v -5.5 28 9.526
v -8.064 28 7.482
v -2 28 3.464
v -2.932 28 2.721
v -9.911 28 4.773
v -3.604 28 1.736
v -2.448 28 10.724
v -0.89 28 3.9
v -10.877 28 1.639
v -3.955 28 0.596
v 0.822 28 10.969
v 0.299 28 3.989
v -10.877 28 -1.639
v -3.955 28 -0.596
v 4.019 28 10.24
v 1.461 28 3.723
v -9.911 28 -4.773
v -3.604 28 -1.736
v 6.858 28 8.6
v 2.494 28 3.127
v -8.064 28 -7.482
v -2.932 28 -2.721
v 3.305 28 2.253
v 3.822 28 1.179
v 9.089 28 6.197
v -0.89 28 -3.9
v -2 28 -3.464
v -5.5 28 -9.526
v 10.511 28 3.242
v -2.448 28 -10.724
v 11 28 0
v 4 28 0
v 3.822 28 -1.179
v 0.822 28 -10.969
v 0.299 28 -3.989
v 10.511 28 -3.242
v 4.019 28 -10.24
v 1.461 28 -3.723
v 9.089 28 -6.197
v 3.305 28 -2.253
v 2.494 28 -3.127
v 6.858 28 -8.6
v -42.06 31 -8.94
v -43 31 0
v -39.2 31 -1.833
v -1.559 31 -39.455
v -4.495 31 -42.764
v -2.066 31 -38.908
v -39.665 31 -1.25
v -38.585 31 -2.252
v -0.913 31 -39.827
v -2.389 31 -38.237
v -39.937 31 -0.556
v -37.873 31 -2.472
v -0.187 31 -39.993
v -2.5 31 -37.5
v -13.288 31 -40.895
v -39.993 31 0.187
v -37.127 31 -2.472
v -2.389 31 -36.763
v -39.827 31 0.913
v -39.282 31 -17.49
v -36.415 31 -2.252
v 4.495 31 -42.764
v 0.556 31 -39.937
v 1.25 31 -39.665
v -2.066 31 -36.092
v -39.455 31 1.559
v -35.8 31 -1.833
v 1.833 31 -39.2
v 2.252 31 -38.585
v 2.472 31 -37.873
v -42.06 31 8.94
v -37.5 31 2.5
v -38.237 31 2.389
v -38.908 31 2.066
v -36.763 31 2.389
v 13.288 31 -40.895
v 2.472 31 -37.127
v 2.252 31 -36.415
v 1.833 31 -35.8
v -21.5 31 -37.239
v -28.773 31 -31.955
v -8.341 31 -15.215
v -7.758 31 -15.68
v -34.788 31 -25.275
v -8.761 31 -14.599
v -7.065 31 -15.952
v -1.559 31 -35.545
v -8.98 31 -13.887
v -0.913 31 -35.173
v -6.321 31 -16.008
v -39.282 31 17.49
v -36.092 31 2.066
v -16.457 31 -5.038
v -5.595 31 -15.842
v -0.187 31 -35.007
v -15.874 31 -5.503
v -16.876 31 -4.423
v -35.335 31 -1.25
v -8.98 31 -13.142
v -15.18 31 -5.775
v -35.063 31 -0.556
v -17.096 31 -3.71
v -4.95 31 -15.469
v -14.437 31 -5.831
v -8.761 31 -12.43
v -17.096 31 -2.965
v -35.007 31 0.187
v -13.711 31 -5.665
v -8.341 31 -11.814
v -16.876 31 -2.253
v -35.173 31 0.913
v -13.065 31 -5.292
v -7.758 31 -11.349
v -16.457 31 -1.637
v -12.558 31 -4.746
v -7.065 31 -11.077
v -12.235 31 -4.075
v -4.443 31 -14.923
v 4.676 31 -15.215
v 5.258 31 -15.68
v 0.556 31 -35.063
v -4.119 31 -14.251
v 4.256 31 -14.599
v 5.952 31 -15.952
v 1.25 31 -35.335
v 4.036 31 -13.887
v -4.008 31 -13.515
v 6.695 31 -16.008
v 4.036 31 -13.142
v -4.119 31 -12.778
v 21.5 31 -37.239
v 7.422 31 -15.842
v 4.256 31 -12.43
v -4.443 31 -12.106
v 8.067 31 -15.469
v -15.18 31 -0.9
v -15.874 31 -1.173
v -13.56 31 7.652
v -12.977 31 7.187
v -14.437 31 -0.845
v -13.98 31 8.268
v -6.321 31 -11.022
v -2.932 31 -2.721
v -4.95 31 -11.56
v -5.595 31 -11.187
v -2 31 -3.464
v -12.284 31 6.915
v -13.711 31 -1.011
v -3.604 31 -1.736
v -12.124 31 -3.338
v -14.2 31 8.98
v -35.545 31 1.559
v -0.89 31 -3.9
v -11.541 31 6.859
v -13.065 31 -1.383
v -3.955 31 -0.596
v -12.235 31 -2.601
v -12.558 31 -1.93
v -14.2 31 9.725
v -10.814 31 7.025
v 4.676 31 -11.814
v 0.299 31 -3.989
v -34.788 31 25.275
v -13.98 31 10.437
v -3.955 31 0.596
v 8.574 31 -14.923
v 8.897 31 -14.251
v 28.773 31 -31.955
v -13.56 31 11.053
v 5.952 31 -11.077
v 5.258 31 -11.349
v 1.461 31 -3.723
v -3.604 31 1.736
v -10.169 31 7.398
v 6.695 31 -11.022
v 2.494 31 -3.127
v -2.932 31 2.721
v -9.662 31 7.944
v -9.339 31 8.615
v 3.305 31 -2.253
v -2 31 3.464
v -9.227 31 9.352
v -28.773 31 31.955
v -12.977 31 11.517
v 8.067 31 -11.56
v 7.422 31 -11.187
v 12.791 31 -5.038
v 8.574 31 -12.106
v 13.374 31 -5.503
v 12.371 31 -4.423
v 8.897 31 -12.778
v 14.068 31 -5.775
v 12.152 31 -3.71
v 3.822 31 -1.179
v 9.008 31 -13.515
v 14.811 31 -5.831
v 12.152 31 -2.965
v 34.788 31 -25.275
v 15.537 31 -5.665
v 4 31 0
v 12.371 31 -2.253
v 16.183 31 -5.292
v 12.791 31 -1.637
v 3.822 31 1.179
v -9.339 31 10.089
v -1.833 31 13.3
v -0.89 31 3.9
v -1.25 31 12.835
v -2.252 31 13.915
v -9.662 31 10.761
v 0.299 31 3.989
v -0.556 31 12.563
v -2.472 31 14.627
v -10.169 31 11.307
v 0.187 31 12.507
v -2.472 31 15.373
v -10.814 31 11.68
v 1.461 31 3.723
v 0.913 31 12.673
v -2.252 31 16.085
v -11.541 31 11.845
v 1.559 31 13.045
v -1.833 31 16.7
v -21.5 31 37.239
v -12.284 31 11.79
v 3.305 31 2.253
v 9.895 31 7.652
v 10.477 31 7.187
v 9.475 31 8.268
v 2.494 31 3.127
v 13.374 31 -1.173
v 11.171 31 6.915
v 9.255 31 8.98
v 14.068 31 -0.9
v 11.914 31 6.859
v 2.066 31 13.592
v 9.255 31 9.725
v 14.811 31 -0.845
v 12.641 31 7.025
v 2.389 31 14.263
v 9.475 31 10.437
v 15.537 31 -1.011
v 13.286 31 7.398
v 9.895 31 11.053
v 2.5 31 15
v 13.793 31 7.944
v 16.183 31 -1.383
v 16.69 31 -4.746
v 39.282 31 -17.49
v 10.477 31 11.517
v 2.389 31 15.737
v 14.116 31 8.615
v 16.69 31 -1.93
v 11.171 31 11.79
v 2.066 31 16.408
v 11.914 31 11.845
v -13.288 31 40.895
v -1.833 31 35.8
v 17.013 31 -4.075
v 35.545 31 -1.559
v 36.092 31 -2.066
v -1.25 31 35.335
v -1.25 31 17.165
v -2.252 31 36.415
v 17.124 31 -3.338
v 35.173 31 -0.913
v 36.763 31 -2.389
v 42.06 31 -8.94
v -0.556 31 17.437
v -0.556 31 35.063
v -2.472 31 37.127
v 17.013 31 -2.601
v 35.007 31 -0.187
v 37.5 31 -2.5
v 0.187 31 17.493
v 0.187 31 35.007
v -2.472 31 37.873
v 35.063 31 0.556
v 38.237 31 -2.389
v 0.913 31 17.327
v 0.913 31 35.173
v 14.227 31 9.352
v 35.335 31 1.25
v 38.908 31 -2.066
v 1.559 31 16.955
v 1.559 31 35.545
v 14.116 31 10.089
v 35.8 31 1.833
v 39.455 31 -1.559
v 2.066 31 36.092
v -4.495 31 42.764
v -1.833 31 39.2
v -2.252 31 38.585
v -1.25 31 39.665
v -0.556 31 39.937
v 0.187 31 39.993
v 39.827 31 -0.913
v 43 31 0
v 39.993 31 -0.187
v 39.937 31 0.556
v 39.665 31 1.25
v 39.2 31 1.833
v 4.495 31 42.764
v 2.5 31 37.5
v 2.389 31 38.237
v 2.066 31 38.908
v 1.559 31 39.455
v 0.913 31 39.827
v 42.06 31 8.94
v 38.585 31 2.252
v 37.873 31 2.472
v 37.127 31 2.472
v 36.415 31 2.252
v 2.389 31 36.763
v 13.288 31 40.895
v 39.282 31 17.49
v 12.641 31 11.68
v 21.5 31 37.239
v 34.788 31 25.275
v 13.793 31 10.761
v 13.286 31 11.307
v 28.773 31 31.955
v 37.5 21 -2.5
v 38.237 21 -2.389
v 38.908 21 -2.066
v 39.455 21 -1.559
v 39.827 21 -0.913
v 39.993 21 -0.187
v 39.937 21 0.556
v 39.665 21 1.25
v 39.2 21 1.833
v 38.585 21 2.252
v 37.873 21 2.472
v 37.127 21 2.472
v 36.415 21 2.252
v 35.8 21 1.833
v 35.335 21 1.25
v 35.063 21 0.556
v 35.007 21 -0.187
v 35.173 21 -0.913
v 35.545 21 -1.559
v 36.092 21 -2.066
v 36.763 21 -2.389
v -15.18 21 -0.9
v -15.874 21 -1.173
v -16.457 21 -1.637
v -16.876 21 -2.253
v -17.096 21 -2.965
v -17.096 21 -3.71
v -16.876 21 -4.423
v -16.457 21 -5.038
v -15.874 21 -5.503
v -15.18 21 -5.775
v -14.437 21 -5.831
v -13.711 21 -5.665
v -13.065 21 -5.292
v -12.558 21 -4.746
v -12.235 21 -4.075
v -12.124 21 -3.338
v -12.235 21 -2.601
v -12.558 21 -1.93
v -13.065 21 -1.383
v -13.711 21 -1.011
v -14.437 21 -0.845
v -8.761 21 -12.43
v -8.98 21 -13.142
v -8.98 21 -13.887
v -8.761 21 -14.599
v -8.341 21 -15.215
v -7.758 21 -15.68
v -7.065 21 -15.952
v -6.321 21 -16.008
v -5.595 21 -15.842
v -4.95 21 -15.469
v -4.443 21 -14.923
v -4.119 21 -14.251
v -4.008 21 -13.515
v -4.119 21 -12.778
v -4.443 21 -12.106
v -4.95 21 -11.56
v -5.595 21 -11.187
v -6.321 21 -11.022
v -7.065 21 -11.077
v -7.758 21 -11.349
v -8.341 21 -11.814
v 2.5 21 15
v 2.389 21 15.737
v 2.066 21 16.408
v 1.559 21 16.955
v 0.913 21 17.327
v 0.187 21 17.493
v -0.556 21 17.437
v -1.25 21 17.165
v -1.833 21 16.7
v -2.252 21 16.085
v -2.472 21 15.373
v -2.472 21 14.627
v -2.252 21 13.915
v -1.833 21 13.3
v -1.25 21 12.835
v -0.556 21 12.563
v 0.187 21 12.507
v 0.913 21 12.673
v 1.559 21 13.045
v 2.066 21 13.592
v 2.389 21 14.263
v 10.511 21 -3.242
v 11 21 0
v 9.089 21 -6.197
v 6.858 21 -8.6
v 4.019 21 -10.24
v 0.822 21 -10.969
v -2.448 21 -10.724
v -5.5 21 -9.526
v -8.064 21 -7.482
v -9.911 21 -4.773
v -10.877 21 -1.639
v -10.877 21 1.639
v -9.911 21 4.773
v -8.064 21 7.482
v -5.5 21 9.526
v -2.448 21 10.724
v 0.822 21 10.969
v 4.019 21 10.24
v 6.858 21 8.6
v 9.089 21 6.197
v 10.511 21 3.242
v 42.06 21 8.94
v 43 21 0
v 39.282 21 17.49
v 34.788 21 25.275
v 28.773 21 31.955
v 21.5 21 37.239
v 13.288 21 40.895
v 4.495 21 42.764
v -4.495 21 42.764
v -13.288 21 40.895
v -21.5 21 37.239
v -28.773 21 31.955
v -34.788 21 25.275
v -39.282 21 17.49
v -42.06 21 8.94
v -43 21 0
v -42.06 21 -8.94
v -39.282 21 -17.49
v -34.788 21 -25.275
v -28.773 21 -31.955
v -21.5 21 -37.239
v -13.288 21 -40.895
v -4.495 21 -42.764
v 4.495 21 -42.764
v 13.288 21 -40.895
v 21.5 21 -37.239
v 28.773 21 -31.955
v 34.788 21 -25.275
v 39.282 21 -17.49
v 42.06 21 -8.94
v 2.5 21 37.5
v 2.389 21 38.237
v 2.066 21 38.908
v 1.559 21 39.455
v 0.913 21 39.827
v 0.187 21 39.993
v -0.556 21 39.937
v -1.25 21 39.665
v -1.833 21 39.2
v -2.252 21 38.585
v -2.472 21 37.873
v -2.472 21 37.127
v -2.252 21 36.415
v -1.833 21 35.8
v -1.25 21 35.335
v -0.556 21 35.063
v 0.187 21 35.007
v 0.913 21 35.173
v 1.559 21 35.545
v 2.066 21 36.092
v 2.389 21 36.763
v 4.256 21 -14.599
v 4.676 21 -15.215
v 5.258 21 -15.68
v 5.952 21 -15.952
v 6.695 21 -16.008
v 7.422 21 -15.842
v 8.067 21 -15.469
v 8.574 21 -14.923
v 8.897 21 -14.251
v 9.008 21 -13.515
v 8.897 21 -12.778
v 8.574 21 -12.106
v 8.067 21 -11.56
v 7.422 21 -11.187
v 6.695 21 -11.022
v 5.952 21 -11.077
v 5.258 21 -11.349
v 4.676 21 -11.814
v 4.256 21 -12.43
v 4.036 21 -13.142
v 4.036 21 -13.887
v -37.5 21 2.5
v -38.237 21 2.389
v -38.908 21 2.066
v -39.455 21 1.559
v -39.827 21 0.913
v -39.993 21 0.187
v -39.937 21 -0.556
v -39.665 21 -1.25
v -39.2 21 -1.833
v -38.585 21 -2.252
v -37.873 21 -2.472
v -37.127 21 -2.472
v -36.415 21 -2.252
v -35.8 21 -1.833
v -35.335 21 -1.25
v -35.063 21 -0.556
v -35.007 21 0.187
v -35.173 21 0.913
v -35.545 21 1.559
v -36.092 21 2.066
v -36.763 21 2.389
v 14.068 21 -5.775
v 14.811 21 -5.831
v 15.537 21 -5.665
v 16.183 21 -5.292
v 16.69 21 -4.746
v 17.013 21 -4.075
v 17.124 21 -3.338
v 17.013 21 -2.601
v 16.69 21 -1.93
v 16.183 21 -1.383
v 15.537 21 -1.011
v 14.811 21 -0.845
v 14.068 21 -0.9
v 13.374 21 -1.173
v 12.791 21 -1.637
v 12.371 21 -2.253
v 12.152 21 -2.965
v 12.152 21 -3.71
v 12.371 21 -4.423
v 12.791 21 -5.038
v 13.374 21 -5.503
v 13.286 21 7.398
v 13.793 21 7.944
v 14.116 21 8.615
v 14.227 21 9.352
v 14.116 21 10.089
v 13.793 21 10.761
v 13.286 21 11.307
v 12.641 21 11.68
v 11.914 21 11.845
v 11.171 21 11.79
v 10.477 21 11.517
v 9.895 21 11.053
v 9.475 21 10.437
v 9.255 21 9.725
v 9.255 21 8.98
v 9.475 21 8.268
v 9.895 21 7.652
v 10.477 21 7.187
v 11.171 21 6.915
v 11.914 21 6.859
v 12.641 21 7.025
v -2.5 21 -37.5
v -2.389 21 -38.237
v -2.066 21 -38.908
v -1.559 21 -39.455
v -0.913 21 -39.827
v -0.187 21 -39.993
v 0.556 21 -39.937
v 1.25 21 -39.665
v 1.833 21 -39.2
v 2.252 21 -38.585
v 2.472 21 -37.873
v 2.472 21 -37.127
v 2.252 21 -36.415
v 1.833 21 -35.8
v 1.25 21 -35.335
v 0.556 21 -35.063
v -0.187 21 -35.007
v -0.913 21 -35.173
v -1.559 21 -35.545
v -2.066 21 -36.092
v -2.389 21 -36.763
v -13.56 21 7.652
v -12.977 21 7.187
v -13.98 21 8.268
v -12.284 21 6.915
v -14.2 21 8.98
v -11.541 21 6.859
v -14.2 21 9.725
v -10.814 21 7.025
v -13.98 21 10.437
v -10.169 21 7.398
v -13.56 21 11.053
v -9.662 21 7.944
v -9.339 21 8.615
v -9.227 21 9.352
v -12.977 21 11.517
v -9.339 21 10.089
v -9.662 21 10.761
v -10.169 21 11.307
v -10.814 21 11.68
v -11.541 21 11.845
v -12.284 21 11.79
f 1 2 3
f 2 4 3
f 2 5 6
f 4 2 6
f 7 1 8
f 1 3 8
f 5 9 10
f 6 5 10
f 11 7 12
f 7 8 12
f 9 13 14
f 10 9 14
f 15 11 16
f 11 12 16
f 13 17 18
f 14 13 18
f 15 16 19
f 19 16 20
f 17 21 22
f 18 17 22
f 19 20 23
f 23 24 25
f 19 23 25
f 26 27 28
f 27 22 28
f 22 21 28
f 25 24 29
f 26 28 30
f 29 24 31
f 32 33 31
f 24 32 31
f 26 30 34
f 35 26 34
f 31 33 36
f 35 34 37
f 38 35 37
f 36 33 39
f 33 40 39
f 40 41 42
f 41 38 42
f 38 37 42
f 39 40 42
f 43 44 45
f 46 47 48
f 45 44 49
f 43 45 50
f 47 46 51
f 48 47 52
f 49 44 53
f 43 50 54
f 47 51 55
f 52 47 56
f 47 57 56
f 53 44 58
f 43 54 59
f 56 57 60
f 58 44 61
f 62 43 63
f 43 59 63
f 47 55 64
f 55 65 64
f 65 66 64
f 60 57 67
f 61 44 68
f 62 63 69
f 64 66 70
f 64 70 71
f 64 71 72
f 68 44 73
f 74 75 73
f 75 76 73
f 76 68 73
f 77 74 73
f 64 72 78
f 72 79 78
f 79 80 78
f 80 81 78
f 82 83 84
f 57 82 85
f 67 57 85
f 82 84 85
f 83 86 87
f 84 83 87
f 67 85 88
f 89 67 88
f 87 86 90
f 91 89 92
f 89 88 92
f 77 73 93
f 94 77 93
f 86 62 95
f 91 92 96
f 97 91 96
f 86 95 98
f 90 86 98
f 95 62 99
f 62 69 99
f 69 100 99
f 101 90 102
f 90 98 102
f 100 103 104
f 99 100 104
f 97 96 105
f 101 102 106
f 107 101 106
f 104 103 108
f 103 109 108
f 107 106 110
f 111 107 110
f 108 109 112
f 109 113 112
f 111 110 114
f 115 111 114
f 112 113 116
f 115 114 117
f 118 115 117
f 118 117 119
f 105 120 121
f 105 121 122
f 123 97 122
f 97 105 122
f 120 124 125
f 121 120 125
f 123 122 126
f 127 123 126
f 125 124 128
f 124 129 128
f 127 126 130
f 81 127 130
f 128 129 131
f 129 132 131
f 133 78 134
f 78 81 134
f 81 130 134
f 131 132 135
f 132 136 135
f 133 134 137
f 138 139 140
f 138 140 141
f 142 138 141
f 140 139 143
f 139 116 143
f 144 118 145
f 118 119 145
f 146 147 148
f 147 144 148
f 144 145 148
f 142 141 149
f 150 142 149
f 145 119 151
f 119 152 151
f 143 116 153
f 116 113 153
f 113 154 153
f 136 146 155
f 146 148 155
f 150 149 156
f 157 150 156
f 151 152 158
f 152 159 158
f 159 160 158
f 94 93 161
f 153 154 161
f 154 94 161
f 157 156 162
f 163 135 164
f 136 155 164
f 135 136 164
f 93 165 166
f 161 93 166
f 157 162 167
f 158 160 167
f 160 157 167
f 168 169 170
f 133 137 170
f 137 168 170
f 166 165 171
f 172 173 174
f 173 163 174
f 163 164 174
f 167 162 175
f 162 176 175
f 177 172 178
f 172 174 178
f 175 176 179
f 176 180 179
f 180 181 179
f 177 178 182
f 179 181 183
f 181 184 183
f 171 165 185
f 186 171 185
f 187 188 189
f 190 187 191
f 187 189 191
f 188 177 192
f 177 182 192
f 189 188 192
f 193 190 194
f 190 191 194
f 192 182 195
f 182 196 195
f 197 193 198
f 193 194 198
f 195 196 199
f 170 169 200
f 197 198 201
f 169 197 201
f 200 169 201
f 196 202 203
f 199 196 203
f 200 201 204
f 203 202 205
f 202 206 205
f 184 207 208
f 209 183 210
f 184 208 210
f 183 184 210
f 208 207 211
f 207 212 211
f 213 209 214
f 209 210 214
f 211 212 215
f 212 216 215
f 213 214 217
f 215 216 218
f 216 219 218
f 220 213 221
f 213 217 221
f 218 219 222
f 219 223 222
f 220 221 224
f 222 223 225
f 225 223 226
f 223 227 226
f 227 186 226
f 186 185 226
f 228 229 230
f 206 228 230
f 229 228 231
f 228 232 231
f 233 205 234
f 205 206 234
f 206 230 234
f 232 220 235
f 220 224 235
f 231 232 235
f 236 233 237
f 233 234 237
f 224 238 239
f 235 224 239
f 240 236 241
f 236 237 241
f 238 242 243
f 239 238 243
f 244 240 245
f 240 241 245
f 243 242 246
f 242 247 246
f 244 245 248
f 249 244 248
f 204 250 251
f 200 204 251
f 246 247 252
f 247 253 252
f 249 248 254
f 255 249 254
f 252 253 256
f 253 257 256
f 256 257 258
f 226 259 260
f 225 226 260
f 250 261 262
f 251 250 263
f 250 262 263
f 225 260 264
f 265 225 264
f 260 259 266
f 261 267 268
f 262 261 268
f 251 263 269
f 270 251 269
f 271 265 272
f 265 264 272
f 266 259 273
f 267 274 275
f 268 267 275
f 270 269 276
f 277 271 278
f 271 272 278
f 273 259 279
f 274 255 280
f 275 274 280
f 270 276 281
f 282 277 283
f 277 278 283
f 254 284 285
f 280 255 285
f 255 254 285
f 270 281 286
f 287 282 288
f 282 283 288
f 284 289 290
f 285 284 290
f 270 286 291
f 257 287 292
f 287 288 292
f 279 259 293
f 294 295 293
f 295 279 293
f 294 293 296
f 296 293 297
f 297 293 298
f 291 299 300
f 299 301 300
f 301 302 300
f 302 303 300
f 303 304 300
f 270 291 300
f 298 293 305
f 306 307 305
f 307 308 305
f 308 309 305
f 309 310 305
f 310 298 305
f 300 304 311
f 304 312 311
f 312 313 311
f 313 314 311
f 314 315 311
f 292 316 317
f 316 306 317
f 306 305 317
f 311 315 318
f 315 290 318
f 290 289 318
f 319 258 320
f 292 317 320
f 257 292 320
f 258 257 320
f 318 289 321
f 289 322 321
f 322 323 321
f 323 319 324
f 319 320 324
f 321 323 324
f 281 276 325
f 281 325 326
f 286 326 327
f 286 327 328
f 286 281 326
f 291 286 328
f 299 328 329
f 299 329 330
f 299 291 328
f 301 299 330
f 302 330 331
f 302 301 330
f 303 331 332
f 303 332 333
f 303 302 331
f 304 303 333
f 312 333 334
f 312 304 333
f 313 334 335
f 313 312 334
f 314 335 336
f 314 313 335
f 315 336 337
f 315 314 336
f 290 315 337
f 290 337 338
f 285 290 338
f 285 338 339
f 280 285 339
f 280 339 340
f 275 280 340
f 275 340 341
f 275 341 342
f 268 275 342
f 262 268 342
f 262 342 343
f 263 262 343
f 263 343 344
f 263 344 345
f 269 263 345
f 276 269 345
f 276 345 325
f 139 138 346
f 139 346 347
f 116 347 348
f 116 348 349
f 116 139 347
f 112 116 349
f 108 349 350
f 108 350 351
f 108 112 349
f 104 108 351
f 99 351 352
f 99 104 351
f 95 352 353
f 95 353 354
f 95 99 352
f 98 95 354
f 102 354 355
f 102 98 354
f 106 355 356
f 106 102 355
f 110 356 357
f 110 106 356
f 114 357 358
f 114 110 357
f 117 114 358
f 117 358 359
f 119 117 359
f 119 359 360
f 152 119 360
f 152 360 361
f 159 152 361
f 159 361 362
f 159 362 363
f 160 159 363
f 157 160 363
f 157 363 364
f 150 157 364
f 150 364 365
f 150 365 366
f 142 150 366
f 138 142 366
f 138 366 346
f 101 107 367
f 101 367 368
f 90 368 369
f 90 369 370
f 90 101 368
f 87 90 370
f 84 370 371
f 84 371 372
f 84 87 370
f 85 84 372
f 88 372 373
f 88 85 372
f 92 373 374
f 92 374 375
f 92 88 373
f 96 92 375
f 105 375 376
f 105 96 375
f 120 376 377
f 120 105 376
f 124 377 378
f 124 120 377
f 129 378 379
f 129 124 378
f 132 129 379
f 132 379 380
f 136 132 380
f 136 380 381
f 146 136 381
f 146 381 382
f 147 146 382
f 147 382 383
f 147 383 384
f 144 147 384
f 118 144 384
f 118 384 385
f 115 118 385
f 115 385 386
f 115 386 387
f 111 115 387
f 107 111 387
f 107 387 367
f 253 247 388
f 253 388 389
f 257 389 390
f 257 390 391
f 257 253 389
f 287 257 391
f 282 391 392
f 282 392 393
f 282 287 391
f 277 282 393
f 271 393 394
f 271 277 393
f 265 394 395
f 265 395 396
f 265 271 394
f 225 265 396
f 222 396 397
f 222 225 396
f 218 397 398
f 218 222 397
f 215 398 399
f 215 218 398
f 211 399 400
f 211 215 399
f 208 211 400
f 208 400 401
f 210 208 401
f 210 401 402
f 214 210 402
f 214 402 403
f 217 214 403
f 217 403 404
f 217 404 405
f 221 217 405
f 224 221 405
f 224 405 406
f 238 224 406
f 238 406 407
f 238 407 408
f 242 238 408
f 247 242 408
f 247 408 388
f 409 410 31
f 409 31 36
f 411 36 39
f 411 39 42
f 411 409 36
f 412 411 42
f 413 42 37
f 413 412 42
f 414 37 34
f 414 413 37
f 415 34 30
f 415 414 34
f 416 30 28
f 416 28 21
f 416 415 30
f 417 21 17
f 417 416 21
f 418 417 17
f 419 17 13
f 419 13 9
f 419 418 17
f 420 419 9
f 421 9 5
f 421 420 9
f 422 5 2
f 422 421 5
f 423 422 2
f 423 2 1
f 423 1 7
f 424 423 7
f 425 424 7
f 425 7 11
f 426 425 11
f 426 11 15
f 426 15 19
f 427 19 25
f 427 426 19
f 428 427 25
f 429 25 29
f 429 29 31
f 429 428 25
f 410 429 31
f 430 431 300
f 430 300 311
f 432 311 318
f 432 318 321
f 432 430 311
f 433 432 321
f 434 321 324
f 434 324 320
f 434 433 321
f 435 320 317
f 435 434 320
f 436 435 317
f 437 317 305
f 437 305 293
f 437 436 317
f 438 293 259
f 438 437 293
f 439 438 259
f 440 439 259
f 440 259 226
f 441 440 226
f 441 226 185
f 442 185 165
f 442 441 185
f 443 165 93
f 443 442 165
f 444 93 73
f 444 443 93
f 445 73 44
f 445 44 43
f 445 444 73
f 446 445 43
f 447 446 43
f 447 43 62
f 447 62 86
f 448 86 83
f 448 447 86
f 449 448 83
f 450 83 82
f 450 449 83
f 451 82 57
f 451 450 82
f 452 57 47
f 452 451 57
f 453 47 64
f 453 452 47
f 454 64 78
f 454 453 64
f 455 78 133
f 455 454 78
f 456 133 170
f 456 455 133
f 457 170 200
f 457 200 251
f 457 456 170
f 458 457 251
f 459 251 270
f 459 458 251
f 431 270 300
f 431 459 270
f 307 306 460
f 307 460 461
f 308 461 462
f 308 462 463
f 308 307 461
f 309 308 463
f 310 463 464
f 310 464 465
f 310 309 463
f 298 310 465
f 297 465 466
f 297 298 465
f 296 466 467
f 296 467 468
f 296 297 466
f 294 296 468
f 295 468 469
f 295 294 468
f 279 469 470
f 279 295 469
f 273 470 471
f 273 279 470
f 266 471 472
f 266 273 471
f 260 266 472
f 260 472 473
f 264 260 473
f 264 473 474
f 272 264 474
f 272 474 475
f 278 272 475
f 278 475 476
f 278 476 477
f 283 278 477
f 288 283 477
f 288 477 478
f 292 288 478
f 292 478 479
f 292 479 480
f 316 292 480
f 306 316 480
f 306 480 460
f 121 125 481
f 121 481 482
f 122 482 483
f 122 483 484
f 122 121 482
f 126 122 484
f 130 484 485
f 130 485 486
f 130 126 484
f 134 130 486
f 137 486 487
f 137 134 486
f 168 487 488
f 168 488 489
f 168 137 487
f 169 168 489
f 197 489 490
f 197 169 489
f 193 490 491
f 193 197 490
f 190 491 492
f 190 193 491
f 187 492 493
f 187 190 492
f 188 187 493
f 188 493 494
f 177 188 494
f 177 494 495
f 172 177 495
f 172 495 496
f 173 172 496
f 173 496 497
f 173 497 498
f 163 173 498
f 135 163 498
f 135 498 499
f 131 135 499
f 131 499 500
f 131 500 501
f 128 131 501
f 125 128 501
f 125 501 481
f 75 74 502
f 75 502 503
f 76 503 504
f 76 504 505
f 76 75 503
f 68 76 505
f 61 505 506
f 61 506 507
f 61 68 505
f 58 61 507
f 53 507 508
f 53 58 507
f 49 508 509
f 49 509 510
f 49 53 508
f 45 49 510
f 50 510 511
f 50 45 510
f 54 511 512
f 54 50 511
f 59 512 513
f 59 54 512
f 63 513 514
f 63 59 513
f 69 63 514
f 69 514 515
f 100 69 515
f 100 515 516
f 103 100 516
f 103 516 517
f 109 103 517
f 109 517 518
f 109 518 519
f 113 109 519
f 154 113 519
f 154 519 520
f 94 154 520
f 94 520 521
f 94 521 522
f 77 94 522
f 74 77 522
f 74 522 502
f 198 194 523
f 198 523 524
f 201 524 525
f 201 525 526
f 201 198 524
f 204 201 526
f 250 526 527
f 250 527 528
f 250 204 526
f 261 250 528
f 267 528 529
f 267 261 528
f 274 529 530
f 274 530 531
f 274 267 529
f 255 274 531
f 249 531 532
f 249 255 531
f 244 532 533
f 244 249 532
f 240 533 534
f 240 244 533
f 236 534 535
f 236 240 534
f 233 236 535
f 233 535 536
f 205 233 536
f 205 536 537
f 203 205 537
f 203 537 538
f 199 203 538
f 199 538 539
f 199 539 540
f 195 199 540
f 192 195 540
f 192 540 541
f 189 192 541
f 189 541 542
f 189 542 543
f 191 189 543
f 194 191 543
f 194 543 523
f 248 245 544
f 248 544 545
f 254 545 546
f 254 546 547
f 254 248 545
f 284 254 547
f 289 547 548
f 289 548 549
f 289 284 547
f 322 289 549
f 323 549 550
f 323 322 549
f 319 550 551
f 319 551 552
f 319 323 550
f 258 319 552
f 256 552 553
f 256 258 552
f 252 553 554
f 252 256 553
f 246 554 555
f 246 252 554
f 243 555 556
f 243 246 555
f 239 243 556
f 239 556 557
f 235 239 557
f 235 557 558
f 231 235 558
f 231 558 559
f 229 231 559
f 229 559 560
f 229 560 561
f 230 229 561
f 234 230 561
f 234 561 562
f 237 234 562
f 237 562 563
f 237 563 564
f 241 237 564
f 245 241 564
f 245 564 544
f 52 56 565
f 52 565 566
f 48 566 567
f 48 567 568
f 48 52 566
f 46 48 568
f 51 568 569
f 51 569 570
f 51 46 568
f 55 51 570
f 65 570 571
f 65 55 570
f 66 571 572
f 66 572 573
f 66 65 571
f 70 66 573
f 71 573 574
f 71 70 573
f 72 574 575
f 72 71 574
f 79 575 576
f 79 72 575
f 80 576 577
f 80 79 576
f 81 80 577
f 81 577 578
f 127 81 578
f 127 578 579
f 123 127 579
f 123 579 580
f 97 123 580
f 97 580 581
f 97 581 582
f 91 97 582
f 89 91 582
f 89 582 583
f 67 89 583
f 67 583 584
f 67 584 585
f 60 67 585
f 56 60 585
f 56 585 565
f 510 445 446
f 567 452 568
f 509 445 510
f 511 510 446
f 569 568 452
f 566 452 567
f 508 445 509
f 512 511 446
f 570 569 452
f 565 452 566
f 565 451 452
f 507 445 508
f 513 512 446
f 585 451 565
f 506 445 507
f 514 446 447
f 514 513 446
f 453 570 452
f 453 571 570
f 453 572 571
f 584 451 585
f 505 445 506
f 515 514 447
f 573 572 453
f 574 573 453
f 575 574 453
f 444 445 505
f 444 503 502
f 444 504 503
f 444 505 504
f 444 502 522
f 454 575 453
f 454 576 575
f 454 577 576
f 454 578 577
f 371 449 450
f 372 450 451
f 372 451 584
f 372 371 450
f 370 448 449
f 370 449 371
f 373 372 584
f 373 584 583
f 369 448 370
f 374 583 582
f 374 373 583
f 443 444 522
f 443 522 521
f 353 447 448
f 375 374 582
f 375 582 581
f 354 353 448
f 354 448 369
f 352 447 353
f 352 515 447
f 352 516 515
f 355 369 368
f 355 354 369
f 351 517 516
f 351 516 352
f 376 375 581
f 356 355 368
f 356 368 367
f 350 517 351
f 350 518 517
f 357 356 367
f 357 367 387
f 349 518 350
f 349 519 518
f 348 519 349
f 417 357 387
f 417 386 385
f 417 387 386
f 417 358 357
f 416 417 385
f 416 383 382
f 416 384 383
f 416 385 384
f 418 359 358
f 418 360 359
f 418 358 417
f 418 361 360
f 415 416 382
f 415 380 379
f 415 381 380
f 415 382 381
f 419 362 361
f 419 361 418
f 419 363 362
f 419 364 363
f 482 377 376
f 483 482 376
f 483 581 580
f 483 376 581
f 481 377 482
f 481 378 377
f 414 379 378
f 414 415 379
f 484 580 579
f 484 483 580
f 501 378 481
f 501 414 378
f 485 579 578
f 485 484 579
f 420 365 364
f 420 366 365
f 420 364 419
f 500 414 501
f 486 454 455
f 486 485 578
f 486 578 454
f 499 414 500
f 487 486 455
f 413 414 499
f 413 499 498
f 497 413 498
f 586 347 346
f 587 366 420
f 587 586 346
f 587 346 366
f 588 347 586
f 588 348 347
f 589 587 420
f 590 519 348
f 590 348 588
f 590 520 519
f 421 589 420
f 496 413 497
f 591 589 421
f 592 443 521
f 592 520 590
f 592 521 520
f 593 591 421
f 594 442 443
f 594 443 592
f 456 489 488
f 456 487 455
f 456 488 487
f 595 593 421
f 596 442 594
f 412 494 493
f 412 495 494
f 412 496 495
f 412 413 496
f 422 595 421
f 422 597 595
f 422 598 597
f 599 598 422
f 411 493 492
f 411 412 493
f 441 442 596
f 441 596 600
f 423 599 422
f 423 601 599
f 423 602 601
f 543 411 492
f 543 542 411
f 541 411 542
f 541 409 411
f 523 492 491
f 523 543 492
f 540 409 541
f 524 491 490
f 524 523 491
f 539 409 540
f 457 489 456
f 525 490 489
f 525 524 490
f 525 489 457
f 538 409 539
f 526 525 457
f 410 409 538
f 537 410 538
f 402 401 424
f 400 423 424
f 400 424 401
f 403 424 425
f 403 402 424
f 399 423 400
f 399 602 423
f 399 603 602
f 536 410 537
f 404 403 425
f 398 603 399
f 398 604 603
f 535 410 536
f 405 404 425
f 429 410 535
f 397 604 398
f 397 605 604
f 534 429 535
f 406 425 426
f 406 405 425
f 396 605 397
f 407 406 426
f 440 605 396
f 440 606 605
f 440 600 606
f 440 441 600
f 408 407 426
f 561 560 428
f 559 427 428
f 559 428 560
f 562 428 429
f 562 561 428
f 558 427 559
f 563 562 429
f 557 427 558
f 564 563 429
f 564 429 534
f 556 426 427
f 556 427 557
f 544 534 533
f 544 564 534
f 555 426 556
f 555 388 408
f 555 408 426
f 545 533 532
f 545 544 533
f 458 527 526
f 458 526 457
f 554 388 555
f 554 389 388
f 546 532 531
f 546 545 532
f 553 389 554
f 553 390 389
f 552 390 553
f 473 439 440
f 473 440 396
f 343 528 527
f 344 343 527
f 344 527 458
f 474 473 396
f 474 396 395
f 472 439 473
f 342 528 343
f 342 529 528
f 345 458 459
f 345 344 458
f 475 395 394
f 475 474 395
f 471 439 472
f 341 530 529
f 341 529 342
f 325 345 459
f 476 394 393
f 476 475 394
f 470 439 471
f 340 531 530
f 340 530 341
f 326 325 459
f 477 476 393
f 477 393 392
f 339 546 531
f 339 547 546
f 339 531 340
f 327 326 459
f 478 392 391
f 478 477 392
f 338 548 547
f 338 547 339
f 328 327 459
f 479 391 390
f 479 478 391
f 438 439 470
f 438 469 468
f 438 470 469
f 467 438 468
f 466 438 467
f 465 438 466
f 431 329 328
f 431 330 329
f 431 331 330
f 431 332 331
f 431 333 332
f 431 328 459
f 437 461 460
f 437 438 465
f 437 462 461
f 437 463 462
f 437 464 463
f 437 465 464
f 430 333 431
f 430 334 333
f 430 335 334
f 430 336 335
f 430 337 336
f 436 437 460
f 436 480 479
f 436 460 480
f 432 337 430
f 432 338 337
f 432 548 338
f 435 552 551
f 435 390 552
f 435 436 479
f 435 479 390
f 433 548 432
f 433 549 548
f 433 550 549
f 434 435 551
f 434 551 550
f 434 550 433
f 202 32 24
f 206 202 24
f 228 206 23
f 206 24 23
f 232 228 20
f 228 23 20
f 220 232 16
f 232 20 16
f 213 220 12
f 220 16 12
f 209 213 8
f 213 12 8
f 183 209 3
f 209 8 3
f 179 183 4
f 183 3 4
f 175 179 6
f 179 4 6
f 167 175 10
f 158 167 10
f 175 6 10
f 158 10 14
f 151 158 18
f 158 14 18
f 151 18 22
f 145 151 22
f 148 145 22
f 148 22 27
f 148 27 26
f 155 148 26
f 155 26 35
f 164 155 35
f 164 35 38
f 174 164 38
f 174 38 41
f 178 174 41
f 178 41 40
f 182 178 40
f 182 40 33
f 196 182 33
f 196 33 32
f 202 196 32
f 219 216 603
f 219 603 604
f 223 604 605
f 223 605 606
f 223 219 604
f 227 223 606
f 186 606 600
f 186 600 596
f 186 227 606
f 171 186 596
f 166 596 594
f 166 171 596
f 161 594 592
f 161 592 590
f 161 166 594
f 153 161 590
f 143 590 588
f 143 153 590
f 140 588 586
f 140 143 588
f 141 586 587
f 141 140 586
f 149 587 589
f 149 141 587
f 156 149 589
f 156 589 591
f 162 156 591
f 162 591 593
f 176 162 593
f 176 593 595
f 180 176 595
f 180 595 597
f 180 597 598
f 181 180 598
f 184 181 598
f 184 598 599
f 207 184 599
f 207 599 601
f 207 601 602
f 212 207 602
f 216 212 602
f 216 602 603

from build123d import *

# Parameters (mm, degrees)
SKETCH008_R           = 43
SKETCH008_R_2         = 4
PAD002_DEPTH          = 10
SKETCH009_R           = 11
POCKET002_DEPTH       = 7
SKETCH010_R           = 2.5
POCKET003_DEPTH       = 254.066565
POLARPATTERN001_COUNT = 7
SKETCH011_R           = 2.5
POCKET004_DEPTH       = 254.066565
POLARPATTERN002_COUNT = 4


with BuildPart() as sidecap:
    # Sketch008 → Pad002 (new body)
    with BuildSketch(Plane.XZ):
        Circle(SKETCH008_R)
        Circle(SKETCH008_R_2, mode=Mode.SUBTRACT)
    extrude(amount=PAD002_DEPTH)

    # Sketch009 (on Face3 of Pad002) → Pocket002 (cut)
    with BuildSketch(Plane(origin=(0, 0, 0), x_dir=(1, 0, 0), z_dir=(0, 1, 0))):
        Circle(SKETCH009_R)
    extrude(amount=-POCKET002_DEPTH, mode=Mode.SUBTRACT)

    # Sketch010 (on Face3 of Pocket002) → Pocket003 (cut, through all)
    with BuildSketch(Plane.XZ.offset(10)):
        with Locations((0, 15)):
            Circle(SKETCH010_R)
    pocket003 = extrude(amount=-POCKET003_DEPTH, mode=Mode.SUBTRACT)

    # PolarPattern001: Pocket003 ×7 about axis
    polarpattern001_axis = Axis((0, -10, 0), (0, -1, 0))
    for i in range(1, POLARPATTERN001_COUNT):
        add(pocket003.rotate(polarpattern001_axis, i * 360 / POLARPATTERN001_COUNT), mode=Mode.SUBTRACT)

    # Sketch011 (on Face3 of PolarPattern001) → Pocket004 (cut, through all)
    with BuildSketch(Plane.XZ.offset(10)):
        with Locations((0, 37.5)):
            Circle(SKETCH011_R)
    pocket004 = extrude(amount=-POCKET004_DEPTH, mode=Mode.SUBTRACT)

    # PolarPattern002: Pocket004 ×4 about axis
    polarpattern002_axis = Axis((0, -10, 0), (0, -1, 0))
    for i in range(1, POLARPATTERN002_COUNT):
        add(pocket004.rotate(polarpattern002_axis, i * 360 / POLARPATTERN002_COUNT), mode=Mode.SUBTRACT)


with BuildPart() as sidecap_1:
    # Body003 placement: moved
    add(sidecap.part.moved(Location((0, -21, 0))))


with BuildPart() as part_mirroring:
    # Part__Mirroring: instance of SideCap
    add(sidecap_1.part.mirror(Plane(origin=(0, 0, 0), x_dir=(1, 0, 0), z_dir=(0, 1, 0))))


solid = part_mirroring.part
